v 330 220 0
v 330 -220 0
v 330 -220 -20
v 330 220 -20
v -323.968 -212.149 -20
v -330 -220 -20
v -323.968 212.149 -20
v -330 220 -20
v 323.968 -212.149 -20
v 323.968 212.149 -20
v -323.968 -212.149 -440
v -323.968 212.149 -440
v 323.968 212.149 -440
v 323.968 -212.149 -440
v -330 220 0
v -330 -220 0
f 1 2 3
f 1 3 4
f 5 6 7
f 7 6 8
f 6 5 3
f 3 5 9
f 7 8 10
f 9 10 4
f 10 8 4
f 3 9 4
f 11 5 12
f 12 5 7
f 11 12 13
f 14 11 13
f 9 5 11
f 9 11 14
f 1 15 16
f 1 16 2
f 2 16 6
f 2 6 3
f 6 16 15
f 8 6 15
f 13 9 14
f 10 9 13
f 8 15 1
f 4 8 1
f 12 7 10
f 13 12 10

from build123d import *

# Parameters (mm, degrees)
F0_W     = 647.936674
F0_H     = 424.298402
F1_DEPTH = 440
F0_W_2   = 660
F0_H_2   = 440
F2_DEPTH = 20


with BuildPart() as f1:
    # F0 (on Top) → F1 (new body)
    with BuildSketch(Plane.XY):
        Rectangle(F0_W, F0_H)
    extrude(amount=-F1_DEPTH)

    # F0 (on Top) → F2 (join)
    with BuildSketch(Plane.XY):
        Rectangle(F0_W_2, F0_H_2)
        Rectangle(F0_W, F0_H, mode=Mode.SUBTRACT)
        Rectangle(F0_W, F0_H)
    extrude(amount=-F2_DEPTH)


solid = f1.part
